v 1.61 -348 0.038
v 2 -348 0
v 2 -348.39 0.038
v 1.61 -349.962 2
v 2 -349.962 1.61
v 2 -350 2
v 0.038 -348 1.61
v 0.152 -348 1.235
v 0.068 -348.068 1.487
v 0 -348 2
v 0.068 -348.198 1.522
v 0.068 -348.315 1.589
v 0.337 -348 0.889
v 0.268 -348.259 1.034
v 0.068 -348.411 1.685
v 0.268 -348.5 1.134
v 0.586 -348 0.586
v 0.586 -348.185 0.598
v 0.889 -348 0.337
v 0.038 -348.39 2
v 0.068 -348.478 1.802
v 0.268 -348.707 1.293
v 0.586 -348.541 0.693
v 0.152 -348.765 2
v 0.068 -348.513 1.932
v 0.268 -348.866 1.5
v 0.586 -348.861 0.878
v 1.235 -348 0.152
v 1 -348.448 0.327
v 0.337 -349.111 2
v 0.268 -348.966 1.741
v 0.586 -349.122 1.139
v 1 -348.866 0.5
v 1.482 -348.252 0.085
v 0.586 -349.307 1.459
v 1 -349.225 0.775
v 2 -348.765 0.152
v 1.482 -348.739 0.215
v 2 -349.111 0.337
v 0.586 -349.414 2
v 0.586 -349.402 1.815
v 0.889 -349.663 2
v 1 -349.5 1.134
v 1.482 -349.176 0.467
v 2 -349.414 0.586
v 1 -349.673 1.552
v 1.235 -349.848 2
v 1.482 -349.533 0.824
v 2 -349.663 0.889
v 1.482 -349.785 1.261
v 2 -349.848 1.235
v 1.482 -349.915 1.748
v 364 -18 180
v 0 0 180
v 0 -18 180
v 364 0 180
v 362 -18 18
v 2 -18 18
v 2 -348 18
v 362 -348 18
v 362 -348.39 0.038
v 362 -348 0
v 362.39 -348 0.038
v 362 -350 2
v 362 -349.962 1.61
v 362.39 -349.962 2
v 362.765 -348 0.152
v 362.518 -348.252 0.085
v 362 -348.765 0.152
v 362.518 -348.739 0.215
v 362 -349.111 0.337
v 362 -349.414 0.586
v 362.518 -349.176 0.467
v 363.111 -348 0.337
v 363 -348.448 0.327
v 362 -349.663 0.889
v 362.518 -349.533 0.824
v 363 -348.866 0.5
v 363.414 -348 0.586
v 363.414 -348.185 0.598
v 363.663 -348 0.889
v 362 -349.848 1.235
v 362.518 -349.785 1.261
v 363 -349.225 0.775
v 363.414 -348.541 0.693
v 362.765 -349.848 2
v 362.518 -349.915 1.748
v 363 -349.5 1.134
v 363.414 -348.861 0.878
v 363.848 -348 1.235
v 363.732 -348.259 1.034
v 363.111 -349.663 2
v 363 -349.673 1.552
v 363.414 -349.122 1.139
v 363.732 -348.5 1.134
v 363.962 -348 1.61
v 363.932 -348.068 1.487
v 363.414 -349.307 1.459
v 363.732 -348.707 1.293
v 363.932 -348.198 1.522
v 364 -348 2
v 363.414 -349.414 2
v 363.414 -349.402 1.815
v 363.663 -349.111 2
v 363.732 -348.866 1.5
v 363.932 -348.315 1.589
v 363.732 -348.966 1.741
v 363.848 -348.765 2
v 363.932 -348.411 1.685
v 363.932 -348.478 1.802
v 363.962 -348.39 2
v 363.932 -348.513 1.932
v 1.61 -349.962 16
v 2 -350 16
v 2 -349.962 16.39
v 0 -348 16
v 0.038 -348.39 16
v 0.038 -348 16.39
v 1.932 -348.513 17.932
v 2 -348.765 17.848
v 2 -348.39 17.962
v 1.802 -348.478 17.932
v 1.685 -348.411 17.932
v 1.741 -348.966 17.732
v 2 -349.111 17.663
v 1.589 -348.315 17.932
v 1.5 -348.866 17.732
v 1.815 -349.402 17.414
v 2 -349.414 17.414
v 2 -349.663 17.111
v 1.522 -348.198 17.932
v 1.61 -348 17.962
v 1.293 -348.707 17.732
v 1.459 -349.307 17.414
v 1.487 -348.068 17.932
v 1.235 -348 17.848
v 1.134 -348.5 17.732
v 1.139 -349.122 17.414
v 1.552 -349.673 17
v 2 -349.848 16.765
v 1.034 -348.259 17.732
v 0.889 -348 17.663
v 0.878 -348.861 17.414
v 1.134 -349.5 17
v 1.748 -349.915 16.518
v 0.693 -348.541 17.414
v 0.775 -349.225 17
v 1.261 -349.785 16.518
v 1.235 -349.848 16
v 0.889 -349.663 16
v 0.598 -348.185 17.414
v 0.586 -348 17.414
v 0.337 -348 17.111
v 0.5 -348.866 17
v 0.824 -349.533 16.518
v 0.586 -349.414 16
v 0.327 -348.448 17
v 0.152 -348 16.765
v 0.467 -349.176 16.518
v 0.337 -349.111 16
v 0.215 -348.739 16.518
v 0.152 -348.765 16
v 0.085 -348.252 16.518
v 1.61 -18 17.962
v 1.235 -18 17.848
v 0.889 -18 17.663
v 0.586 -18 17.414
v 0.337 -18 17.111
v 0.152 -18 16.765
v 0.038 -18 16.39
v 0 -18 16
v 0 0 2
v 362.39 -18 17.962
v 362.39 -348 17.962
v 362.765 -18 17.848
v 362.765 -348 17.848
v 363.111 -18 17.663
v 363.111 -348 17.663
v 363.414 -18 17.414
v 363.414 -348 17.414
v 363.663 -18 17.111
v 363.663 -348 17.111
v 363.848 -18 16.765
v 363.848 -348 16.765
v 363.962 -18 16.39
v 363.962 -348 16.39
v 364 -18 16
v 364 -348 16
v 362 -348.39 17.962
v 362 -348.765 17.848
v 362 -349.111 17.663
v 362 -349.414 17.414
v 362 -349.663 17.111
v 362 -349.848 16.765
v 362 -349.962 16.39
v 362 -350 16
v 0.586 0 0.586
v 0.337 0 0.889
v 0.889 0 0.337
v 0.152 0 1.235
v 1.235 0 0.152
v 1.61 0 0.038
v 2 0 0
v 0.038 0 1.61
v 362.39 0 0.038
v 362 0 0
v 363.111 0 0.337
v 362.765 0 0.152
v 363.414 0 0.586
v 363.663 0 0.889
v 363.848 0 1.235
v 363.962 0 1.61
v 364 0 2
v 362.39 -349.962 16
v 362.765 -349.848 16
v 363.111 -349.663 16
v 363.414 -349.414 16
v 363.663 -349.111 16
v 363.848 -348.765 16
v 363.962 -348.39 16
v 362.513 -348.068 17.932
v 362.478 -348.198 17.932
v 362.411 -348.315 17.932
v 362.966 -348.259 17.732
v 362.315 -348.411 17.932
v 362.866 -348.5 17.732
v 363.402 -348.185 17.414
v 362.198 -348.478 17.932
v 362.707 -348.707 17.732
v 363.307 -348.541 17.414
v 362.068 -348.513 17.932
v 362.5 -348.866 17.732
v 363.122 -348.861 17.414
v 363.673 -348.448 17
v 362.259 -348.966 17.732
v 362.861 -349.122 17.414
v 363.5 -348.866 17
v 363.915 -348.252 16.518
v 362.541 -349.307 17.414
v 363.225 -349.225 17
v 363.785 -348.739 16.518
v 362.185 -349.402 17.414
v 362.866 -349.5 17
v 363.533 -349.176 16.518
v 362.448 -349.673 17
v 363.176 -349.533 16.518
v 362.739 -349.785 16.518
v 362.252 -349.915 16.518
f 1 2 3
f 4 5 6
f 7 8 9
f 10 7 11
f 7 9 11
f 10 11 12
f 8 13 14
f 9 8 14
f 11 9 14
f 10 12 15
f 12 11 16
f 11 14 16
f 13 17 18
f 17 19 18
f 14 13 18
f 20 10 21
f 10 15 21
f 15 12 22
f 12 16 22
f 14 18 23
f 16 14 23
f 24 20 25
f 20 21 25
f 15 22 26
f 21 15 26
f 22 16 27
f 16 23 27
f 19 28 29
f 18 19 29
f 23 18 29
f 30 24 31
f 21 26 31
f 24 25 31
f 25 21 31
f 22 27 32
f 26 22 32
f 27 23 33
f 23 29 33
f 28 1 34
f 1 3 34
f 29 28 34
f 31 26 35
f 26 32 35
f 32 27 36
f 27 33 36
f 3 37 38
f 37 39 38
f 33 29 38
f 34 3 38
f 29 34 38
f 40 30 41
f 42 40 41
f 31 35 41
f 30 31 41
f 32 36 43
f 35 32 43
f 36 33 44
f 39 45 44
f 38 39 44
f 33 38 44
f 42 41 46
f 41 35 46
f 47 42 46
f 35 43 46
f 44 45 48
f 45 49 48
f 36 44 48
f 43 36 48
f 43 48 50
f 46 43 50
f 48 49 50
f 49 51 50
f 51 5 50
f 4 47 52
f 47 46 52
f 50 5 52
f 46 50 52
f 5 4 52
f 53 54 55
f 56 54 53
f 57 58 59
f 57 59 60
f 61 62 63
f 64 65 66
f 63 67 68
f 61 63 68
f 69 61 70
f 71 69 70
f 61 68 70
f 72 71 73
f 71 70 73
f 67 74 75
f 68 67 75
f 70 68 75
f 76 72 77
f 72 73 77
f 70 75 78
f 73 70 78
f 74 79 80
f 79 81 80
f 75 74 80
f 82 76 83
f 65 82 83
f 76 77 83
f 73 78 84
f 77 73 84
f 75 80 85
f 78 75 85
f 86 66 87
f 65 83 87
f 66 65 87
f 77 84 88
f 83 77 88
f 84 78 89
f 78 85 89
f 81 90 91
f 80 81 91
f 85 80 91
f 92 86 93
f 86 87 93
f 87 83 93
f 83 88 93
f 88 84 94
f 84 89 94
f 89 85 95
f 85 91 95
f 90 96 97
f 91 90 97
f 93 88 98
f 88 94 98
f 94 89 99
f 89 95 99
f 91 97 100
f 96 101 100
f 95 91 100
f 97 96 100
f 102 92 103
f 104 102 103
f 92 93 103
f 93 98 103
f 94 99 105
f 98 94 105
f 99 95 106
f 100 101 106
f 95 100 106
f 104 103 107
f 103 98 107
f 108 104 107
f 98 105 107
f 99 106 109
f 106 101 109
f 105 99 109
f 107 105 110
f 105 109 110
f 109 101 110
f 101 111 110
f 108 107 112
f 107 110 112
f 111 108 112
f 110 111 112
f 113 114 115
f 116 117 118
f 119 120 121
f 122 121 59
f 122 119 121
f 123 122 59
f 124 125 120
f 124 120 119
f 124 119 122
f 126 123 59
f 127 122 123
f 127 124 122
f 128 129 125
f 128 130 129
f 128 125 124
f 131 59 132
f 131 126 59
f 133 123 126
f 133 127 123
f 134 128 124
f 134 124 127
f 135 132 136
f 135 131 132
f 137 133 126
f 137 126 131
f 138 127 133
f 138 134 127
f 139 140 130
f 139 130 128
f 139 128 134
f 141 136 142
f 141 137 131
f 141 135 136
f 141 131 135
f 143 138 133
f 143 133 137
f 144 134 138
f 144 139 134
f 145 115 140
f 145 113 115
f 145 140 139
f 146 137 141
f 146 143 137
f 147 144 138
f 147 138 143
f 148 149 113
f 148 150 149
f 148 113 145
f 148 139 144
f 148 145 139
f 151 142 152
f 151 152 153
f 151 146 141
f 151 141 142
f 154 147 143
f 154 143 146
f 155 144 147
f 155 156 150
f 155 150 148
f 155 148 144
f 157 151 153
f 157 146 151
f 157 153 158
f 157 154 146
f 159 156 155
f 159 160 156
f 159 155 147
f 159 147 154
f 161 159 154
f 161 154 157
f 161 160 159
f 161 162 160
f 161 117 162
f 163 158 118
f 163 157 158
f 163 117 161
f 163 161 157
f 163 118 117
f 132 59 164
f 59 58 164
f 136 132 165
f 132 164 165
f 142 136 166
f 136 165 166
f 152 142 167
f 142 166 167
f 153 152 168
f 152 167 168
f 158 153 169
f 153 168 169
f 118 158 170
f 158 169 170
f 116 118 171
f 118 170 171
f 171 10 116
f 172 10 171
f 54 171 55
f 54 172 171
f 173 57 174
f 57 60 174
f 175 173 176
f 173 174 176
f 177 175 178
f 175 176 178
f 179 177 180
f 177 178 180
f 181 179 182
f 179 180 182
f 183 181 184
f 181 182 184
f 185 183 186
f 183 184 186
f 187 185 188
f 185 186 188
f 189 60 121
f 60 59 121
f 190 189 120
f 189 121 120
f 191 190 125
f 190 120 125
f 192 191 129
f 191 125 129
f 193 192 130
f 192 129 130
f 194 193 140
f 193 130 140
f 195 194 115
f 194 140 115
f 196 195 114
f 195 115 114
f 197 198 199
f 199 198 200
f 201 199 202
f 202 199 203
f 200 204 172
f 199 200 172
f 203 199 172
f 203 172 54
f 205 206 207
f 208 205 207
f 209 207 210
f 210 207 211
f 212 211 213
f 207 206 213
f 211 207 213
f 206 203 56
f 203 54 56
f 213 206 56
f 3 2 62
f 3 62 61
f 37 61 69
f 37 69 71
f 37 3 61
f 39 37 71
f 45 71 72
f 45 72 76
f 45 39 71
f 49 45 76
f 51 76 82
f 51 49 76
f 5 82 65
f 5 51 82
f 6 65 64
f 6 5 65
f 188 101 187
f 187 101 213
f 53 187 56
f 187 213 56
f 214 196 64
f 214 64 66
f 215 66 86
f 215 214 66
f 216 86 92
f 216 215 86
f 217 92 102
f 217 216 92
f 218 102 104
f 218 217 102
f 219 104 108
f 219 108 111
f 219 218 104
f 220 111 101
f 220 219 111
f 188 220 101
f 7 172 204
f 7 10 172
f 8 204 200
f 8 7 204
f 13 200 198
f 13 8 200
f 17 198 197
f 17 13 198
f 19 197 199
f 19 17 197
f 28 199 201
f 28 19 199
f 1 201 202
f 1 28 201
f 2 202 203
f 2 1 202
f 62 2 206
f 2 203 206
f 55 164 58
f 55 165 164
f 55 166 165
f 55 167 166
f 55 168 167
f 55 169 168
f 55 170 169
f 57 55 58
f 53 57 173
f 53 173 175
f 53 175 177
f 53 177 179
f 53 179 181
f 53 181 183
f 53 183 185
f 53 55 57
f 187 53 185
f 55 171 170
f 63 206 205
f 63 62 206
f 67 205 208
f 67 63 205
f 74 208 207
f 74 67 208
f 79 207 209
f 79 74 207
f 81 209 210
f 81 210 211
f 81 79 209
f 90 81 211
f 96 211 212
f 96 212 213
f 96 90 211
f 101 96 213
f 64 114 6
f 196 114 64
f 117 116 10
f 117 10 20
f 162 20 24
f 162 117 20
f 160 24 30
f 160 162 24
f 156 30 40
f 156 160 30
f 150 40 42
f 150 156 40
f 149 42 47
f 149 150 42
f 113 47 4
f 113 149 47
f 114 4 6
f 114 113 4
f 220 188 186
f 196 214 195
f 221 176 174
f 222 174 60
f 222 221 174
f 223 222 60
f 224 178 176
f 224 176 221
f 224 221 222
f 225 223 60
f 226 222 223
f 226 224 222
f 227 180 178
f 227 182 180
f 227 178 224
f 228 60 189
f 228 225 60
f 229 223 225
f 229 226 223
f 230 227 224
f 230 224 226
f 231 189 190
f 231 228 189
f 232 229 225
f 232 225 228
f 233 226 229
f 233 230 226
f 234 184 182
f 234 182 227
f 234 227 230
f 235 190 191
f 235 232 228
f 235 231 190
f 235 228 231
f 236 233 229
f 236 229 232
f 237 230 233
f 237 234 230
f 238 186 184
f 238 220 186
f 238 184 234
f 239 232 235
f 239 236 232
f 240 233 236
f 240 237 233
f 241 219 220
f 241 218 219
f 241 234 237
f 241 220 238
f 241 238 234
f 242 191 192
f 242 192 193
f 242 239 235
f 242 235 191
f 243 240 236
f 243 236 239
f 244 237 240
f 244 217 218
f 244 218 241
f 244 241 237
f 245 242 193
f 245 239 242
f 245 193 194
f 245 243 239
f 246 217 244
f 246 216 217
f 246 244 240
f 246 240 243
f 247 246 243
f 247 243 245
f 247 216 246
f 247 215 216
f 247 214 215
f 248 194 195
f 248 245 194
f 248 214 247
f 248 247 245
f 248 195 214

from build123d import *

# Parameters (mm, degrees)
F0_W     = 37.1829867363
F0_H     = 34.0256392956
F1_DEPTH = 350
F2_DEPTH = 400
F3_DEPTH = 180
F4_T     = -18
F5_DEPTH = 36
F6_R     = 2
F7_R     = 2
F8_R     = 2


with BuildPart() as f1:
    # F0 (on Front) → F1 (new body)
    with BuildSketch(Plane.XZ):
        with Locations((18.5914933681, 17.0128196478)):
            Rectangle(F0_W, F0_H)
    extrude(amount=F1_DEPTH)

    # F2 (add): a face of the model
    f2_faces = [f1.faces().sort_by_distance(p)[0] for p in [
        (0, -175, 17.0128196478),
    ]]
    extrude(f2_faces, amount=-F2_DEPTH)

    # F3 (add): a face of the model
    f3_faces = [f1.faces().sort_by_distance(p)[0] for p in [
        (200, -175, 0),
    ]]
    extrude(f3_faces, amount=-F3_DEPTH)

    # F4
    f4_openings = [f1.faces().sort_by_distance(p)[0] for p in [
        (0, -175, 90),
        (200, -350, 90),
        (200, -175, 180),
        (400, -175, 90),
    ]]
    offset(amount=F4_T, openings=f4_openings)

    # F5 (cut): a face of the model
    f5_faces = [f1.faces().sort_by_distance(p)[0] for p in [
        (400, -9, 176.0642662692),
    ]]
    extrude(f5_faces, amount=-F5_DEPTH, mode=Mode.SUBTRACT)

    # F6
    f6_edges = [f1.edges().sort_by_distance(p)[0] for p in [
        (182, -350, 0),
    ]]
    fillet(f6_edges, radius=F6_R)

    # F7
    f7_edges = [f1.edges().sort_by_distance(p)[0] for p in [
        (364, -350, 10),
        (0, -350, 10),
    ]]
    fillet(f7_edges, radius=F7_R)

    # F8
    f8_edges = [f1.edges().sort_by_distance(p)[0] for p in [
        (182, -350, 18),
    ]]
    fillet(f8_edges, radius=F8_R)


solid = f1.part
